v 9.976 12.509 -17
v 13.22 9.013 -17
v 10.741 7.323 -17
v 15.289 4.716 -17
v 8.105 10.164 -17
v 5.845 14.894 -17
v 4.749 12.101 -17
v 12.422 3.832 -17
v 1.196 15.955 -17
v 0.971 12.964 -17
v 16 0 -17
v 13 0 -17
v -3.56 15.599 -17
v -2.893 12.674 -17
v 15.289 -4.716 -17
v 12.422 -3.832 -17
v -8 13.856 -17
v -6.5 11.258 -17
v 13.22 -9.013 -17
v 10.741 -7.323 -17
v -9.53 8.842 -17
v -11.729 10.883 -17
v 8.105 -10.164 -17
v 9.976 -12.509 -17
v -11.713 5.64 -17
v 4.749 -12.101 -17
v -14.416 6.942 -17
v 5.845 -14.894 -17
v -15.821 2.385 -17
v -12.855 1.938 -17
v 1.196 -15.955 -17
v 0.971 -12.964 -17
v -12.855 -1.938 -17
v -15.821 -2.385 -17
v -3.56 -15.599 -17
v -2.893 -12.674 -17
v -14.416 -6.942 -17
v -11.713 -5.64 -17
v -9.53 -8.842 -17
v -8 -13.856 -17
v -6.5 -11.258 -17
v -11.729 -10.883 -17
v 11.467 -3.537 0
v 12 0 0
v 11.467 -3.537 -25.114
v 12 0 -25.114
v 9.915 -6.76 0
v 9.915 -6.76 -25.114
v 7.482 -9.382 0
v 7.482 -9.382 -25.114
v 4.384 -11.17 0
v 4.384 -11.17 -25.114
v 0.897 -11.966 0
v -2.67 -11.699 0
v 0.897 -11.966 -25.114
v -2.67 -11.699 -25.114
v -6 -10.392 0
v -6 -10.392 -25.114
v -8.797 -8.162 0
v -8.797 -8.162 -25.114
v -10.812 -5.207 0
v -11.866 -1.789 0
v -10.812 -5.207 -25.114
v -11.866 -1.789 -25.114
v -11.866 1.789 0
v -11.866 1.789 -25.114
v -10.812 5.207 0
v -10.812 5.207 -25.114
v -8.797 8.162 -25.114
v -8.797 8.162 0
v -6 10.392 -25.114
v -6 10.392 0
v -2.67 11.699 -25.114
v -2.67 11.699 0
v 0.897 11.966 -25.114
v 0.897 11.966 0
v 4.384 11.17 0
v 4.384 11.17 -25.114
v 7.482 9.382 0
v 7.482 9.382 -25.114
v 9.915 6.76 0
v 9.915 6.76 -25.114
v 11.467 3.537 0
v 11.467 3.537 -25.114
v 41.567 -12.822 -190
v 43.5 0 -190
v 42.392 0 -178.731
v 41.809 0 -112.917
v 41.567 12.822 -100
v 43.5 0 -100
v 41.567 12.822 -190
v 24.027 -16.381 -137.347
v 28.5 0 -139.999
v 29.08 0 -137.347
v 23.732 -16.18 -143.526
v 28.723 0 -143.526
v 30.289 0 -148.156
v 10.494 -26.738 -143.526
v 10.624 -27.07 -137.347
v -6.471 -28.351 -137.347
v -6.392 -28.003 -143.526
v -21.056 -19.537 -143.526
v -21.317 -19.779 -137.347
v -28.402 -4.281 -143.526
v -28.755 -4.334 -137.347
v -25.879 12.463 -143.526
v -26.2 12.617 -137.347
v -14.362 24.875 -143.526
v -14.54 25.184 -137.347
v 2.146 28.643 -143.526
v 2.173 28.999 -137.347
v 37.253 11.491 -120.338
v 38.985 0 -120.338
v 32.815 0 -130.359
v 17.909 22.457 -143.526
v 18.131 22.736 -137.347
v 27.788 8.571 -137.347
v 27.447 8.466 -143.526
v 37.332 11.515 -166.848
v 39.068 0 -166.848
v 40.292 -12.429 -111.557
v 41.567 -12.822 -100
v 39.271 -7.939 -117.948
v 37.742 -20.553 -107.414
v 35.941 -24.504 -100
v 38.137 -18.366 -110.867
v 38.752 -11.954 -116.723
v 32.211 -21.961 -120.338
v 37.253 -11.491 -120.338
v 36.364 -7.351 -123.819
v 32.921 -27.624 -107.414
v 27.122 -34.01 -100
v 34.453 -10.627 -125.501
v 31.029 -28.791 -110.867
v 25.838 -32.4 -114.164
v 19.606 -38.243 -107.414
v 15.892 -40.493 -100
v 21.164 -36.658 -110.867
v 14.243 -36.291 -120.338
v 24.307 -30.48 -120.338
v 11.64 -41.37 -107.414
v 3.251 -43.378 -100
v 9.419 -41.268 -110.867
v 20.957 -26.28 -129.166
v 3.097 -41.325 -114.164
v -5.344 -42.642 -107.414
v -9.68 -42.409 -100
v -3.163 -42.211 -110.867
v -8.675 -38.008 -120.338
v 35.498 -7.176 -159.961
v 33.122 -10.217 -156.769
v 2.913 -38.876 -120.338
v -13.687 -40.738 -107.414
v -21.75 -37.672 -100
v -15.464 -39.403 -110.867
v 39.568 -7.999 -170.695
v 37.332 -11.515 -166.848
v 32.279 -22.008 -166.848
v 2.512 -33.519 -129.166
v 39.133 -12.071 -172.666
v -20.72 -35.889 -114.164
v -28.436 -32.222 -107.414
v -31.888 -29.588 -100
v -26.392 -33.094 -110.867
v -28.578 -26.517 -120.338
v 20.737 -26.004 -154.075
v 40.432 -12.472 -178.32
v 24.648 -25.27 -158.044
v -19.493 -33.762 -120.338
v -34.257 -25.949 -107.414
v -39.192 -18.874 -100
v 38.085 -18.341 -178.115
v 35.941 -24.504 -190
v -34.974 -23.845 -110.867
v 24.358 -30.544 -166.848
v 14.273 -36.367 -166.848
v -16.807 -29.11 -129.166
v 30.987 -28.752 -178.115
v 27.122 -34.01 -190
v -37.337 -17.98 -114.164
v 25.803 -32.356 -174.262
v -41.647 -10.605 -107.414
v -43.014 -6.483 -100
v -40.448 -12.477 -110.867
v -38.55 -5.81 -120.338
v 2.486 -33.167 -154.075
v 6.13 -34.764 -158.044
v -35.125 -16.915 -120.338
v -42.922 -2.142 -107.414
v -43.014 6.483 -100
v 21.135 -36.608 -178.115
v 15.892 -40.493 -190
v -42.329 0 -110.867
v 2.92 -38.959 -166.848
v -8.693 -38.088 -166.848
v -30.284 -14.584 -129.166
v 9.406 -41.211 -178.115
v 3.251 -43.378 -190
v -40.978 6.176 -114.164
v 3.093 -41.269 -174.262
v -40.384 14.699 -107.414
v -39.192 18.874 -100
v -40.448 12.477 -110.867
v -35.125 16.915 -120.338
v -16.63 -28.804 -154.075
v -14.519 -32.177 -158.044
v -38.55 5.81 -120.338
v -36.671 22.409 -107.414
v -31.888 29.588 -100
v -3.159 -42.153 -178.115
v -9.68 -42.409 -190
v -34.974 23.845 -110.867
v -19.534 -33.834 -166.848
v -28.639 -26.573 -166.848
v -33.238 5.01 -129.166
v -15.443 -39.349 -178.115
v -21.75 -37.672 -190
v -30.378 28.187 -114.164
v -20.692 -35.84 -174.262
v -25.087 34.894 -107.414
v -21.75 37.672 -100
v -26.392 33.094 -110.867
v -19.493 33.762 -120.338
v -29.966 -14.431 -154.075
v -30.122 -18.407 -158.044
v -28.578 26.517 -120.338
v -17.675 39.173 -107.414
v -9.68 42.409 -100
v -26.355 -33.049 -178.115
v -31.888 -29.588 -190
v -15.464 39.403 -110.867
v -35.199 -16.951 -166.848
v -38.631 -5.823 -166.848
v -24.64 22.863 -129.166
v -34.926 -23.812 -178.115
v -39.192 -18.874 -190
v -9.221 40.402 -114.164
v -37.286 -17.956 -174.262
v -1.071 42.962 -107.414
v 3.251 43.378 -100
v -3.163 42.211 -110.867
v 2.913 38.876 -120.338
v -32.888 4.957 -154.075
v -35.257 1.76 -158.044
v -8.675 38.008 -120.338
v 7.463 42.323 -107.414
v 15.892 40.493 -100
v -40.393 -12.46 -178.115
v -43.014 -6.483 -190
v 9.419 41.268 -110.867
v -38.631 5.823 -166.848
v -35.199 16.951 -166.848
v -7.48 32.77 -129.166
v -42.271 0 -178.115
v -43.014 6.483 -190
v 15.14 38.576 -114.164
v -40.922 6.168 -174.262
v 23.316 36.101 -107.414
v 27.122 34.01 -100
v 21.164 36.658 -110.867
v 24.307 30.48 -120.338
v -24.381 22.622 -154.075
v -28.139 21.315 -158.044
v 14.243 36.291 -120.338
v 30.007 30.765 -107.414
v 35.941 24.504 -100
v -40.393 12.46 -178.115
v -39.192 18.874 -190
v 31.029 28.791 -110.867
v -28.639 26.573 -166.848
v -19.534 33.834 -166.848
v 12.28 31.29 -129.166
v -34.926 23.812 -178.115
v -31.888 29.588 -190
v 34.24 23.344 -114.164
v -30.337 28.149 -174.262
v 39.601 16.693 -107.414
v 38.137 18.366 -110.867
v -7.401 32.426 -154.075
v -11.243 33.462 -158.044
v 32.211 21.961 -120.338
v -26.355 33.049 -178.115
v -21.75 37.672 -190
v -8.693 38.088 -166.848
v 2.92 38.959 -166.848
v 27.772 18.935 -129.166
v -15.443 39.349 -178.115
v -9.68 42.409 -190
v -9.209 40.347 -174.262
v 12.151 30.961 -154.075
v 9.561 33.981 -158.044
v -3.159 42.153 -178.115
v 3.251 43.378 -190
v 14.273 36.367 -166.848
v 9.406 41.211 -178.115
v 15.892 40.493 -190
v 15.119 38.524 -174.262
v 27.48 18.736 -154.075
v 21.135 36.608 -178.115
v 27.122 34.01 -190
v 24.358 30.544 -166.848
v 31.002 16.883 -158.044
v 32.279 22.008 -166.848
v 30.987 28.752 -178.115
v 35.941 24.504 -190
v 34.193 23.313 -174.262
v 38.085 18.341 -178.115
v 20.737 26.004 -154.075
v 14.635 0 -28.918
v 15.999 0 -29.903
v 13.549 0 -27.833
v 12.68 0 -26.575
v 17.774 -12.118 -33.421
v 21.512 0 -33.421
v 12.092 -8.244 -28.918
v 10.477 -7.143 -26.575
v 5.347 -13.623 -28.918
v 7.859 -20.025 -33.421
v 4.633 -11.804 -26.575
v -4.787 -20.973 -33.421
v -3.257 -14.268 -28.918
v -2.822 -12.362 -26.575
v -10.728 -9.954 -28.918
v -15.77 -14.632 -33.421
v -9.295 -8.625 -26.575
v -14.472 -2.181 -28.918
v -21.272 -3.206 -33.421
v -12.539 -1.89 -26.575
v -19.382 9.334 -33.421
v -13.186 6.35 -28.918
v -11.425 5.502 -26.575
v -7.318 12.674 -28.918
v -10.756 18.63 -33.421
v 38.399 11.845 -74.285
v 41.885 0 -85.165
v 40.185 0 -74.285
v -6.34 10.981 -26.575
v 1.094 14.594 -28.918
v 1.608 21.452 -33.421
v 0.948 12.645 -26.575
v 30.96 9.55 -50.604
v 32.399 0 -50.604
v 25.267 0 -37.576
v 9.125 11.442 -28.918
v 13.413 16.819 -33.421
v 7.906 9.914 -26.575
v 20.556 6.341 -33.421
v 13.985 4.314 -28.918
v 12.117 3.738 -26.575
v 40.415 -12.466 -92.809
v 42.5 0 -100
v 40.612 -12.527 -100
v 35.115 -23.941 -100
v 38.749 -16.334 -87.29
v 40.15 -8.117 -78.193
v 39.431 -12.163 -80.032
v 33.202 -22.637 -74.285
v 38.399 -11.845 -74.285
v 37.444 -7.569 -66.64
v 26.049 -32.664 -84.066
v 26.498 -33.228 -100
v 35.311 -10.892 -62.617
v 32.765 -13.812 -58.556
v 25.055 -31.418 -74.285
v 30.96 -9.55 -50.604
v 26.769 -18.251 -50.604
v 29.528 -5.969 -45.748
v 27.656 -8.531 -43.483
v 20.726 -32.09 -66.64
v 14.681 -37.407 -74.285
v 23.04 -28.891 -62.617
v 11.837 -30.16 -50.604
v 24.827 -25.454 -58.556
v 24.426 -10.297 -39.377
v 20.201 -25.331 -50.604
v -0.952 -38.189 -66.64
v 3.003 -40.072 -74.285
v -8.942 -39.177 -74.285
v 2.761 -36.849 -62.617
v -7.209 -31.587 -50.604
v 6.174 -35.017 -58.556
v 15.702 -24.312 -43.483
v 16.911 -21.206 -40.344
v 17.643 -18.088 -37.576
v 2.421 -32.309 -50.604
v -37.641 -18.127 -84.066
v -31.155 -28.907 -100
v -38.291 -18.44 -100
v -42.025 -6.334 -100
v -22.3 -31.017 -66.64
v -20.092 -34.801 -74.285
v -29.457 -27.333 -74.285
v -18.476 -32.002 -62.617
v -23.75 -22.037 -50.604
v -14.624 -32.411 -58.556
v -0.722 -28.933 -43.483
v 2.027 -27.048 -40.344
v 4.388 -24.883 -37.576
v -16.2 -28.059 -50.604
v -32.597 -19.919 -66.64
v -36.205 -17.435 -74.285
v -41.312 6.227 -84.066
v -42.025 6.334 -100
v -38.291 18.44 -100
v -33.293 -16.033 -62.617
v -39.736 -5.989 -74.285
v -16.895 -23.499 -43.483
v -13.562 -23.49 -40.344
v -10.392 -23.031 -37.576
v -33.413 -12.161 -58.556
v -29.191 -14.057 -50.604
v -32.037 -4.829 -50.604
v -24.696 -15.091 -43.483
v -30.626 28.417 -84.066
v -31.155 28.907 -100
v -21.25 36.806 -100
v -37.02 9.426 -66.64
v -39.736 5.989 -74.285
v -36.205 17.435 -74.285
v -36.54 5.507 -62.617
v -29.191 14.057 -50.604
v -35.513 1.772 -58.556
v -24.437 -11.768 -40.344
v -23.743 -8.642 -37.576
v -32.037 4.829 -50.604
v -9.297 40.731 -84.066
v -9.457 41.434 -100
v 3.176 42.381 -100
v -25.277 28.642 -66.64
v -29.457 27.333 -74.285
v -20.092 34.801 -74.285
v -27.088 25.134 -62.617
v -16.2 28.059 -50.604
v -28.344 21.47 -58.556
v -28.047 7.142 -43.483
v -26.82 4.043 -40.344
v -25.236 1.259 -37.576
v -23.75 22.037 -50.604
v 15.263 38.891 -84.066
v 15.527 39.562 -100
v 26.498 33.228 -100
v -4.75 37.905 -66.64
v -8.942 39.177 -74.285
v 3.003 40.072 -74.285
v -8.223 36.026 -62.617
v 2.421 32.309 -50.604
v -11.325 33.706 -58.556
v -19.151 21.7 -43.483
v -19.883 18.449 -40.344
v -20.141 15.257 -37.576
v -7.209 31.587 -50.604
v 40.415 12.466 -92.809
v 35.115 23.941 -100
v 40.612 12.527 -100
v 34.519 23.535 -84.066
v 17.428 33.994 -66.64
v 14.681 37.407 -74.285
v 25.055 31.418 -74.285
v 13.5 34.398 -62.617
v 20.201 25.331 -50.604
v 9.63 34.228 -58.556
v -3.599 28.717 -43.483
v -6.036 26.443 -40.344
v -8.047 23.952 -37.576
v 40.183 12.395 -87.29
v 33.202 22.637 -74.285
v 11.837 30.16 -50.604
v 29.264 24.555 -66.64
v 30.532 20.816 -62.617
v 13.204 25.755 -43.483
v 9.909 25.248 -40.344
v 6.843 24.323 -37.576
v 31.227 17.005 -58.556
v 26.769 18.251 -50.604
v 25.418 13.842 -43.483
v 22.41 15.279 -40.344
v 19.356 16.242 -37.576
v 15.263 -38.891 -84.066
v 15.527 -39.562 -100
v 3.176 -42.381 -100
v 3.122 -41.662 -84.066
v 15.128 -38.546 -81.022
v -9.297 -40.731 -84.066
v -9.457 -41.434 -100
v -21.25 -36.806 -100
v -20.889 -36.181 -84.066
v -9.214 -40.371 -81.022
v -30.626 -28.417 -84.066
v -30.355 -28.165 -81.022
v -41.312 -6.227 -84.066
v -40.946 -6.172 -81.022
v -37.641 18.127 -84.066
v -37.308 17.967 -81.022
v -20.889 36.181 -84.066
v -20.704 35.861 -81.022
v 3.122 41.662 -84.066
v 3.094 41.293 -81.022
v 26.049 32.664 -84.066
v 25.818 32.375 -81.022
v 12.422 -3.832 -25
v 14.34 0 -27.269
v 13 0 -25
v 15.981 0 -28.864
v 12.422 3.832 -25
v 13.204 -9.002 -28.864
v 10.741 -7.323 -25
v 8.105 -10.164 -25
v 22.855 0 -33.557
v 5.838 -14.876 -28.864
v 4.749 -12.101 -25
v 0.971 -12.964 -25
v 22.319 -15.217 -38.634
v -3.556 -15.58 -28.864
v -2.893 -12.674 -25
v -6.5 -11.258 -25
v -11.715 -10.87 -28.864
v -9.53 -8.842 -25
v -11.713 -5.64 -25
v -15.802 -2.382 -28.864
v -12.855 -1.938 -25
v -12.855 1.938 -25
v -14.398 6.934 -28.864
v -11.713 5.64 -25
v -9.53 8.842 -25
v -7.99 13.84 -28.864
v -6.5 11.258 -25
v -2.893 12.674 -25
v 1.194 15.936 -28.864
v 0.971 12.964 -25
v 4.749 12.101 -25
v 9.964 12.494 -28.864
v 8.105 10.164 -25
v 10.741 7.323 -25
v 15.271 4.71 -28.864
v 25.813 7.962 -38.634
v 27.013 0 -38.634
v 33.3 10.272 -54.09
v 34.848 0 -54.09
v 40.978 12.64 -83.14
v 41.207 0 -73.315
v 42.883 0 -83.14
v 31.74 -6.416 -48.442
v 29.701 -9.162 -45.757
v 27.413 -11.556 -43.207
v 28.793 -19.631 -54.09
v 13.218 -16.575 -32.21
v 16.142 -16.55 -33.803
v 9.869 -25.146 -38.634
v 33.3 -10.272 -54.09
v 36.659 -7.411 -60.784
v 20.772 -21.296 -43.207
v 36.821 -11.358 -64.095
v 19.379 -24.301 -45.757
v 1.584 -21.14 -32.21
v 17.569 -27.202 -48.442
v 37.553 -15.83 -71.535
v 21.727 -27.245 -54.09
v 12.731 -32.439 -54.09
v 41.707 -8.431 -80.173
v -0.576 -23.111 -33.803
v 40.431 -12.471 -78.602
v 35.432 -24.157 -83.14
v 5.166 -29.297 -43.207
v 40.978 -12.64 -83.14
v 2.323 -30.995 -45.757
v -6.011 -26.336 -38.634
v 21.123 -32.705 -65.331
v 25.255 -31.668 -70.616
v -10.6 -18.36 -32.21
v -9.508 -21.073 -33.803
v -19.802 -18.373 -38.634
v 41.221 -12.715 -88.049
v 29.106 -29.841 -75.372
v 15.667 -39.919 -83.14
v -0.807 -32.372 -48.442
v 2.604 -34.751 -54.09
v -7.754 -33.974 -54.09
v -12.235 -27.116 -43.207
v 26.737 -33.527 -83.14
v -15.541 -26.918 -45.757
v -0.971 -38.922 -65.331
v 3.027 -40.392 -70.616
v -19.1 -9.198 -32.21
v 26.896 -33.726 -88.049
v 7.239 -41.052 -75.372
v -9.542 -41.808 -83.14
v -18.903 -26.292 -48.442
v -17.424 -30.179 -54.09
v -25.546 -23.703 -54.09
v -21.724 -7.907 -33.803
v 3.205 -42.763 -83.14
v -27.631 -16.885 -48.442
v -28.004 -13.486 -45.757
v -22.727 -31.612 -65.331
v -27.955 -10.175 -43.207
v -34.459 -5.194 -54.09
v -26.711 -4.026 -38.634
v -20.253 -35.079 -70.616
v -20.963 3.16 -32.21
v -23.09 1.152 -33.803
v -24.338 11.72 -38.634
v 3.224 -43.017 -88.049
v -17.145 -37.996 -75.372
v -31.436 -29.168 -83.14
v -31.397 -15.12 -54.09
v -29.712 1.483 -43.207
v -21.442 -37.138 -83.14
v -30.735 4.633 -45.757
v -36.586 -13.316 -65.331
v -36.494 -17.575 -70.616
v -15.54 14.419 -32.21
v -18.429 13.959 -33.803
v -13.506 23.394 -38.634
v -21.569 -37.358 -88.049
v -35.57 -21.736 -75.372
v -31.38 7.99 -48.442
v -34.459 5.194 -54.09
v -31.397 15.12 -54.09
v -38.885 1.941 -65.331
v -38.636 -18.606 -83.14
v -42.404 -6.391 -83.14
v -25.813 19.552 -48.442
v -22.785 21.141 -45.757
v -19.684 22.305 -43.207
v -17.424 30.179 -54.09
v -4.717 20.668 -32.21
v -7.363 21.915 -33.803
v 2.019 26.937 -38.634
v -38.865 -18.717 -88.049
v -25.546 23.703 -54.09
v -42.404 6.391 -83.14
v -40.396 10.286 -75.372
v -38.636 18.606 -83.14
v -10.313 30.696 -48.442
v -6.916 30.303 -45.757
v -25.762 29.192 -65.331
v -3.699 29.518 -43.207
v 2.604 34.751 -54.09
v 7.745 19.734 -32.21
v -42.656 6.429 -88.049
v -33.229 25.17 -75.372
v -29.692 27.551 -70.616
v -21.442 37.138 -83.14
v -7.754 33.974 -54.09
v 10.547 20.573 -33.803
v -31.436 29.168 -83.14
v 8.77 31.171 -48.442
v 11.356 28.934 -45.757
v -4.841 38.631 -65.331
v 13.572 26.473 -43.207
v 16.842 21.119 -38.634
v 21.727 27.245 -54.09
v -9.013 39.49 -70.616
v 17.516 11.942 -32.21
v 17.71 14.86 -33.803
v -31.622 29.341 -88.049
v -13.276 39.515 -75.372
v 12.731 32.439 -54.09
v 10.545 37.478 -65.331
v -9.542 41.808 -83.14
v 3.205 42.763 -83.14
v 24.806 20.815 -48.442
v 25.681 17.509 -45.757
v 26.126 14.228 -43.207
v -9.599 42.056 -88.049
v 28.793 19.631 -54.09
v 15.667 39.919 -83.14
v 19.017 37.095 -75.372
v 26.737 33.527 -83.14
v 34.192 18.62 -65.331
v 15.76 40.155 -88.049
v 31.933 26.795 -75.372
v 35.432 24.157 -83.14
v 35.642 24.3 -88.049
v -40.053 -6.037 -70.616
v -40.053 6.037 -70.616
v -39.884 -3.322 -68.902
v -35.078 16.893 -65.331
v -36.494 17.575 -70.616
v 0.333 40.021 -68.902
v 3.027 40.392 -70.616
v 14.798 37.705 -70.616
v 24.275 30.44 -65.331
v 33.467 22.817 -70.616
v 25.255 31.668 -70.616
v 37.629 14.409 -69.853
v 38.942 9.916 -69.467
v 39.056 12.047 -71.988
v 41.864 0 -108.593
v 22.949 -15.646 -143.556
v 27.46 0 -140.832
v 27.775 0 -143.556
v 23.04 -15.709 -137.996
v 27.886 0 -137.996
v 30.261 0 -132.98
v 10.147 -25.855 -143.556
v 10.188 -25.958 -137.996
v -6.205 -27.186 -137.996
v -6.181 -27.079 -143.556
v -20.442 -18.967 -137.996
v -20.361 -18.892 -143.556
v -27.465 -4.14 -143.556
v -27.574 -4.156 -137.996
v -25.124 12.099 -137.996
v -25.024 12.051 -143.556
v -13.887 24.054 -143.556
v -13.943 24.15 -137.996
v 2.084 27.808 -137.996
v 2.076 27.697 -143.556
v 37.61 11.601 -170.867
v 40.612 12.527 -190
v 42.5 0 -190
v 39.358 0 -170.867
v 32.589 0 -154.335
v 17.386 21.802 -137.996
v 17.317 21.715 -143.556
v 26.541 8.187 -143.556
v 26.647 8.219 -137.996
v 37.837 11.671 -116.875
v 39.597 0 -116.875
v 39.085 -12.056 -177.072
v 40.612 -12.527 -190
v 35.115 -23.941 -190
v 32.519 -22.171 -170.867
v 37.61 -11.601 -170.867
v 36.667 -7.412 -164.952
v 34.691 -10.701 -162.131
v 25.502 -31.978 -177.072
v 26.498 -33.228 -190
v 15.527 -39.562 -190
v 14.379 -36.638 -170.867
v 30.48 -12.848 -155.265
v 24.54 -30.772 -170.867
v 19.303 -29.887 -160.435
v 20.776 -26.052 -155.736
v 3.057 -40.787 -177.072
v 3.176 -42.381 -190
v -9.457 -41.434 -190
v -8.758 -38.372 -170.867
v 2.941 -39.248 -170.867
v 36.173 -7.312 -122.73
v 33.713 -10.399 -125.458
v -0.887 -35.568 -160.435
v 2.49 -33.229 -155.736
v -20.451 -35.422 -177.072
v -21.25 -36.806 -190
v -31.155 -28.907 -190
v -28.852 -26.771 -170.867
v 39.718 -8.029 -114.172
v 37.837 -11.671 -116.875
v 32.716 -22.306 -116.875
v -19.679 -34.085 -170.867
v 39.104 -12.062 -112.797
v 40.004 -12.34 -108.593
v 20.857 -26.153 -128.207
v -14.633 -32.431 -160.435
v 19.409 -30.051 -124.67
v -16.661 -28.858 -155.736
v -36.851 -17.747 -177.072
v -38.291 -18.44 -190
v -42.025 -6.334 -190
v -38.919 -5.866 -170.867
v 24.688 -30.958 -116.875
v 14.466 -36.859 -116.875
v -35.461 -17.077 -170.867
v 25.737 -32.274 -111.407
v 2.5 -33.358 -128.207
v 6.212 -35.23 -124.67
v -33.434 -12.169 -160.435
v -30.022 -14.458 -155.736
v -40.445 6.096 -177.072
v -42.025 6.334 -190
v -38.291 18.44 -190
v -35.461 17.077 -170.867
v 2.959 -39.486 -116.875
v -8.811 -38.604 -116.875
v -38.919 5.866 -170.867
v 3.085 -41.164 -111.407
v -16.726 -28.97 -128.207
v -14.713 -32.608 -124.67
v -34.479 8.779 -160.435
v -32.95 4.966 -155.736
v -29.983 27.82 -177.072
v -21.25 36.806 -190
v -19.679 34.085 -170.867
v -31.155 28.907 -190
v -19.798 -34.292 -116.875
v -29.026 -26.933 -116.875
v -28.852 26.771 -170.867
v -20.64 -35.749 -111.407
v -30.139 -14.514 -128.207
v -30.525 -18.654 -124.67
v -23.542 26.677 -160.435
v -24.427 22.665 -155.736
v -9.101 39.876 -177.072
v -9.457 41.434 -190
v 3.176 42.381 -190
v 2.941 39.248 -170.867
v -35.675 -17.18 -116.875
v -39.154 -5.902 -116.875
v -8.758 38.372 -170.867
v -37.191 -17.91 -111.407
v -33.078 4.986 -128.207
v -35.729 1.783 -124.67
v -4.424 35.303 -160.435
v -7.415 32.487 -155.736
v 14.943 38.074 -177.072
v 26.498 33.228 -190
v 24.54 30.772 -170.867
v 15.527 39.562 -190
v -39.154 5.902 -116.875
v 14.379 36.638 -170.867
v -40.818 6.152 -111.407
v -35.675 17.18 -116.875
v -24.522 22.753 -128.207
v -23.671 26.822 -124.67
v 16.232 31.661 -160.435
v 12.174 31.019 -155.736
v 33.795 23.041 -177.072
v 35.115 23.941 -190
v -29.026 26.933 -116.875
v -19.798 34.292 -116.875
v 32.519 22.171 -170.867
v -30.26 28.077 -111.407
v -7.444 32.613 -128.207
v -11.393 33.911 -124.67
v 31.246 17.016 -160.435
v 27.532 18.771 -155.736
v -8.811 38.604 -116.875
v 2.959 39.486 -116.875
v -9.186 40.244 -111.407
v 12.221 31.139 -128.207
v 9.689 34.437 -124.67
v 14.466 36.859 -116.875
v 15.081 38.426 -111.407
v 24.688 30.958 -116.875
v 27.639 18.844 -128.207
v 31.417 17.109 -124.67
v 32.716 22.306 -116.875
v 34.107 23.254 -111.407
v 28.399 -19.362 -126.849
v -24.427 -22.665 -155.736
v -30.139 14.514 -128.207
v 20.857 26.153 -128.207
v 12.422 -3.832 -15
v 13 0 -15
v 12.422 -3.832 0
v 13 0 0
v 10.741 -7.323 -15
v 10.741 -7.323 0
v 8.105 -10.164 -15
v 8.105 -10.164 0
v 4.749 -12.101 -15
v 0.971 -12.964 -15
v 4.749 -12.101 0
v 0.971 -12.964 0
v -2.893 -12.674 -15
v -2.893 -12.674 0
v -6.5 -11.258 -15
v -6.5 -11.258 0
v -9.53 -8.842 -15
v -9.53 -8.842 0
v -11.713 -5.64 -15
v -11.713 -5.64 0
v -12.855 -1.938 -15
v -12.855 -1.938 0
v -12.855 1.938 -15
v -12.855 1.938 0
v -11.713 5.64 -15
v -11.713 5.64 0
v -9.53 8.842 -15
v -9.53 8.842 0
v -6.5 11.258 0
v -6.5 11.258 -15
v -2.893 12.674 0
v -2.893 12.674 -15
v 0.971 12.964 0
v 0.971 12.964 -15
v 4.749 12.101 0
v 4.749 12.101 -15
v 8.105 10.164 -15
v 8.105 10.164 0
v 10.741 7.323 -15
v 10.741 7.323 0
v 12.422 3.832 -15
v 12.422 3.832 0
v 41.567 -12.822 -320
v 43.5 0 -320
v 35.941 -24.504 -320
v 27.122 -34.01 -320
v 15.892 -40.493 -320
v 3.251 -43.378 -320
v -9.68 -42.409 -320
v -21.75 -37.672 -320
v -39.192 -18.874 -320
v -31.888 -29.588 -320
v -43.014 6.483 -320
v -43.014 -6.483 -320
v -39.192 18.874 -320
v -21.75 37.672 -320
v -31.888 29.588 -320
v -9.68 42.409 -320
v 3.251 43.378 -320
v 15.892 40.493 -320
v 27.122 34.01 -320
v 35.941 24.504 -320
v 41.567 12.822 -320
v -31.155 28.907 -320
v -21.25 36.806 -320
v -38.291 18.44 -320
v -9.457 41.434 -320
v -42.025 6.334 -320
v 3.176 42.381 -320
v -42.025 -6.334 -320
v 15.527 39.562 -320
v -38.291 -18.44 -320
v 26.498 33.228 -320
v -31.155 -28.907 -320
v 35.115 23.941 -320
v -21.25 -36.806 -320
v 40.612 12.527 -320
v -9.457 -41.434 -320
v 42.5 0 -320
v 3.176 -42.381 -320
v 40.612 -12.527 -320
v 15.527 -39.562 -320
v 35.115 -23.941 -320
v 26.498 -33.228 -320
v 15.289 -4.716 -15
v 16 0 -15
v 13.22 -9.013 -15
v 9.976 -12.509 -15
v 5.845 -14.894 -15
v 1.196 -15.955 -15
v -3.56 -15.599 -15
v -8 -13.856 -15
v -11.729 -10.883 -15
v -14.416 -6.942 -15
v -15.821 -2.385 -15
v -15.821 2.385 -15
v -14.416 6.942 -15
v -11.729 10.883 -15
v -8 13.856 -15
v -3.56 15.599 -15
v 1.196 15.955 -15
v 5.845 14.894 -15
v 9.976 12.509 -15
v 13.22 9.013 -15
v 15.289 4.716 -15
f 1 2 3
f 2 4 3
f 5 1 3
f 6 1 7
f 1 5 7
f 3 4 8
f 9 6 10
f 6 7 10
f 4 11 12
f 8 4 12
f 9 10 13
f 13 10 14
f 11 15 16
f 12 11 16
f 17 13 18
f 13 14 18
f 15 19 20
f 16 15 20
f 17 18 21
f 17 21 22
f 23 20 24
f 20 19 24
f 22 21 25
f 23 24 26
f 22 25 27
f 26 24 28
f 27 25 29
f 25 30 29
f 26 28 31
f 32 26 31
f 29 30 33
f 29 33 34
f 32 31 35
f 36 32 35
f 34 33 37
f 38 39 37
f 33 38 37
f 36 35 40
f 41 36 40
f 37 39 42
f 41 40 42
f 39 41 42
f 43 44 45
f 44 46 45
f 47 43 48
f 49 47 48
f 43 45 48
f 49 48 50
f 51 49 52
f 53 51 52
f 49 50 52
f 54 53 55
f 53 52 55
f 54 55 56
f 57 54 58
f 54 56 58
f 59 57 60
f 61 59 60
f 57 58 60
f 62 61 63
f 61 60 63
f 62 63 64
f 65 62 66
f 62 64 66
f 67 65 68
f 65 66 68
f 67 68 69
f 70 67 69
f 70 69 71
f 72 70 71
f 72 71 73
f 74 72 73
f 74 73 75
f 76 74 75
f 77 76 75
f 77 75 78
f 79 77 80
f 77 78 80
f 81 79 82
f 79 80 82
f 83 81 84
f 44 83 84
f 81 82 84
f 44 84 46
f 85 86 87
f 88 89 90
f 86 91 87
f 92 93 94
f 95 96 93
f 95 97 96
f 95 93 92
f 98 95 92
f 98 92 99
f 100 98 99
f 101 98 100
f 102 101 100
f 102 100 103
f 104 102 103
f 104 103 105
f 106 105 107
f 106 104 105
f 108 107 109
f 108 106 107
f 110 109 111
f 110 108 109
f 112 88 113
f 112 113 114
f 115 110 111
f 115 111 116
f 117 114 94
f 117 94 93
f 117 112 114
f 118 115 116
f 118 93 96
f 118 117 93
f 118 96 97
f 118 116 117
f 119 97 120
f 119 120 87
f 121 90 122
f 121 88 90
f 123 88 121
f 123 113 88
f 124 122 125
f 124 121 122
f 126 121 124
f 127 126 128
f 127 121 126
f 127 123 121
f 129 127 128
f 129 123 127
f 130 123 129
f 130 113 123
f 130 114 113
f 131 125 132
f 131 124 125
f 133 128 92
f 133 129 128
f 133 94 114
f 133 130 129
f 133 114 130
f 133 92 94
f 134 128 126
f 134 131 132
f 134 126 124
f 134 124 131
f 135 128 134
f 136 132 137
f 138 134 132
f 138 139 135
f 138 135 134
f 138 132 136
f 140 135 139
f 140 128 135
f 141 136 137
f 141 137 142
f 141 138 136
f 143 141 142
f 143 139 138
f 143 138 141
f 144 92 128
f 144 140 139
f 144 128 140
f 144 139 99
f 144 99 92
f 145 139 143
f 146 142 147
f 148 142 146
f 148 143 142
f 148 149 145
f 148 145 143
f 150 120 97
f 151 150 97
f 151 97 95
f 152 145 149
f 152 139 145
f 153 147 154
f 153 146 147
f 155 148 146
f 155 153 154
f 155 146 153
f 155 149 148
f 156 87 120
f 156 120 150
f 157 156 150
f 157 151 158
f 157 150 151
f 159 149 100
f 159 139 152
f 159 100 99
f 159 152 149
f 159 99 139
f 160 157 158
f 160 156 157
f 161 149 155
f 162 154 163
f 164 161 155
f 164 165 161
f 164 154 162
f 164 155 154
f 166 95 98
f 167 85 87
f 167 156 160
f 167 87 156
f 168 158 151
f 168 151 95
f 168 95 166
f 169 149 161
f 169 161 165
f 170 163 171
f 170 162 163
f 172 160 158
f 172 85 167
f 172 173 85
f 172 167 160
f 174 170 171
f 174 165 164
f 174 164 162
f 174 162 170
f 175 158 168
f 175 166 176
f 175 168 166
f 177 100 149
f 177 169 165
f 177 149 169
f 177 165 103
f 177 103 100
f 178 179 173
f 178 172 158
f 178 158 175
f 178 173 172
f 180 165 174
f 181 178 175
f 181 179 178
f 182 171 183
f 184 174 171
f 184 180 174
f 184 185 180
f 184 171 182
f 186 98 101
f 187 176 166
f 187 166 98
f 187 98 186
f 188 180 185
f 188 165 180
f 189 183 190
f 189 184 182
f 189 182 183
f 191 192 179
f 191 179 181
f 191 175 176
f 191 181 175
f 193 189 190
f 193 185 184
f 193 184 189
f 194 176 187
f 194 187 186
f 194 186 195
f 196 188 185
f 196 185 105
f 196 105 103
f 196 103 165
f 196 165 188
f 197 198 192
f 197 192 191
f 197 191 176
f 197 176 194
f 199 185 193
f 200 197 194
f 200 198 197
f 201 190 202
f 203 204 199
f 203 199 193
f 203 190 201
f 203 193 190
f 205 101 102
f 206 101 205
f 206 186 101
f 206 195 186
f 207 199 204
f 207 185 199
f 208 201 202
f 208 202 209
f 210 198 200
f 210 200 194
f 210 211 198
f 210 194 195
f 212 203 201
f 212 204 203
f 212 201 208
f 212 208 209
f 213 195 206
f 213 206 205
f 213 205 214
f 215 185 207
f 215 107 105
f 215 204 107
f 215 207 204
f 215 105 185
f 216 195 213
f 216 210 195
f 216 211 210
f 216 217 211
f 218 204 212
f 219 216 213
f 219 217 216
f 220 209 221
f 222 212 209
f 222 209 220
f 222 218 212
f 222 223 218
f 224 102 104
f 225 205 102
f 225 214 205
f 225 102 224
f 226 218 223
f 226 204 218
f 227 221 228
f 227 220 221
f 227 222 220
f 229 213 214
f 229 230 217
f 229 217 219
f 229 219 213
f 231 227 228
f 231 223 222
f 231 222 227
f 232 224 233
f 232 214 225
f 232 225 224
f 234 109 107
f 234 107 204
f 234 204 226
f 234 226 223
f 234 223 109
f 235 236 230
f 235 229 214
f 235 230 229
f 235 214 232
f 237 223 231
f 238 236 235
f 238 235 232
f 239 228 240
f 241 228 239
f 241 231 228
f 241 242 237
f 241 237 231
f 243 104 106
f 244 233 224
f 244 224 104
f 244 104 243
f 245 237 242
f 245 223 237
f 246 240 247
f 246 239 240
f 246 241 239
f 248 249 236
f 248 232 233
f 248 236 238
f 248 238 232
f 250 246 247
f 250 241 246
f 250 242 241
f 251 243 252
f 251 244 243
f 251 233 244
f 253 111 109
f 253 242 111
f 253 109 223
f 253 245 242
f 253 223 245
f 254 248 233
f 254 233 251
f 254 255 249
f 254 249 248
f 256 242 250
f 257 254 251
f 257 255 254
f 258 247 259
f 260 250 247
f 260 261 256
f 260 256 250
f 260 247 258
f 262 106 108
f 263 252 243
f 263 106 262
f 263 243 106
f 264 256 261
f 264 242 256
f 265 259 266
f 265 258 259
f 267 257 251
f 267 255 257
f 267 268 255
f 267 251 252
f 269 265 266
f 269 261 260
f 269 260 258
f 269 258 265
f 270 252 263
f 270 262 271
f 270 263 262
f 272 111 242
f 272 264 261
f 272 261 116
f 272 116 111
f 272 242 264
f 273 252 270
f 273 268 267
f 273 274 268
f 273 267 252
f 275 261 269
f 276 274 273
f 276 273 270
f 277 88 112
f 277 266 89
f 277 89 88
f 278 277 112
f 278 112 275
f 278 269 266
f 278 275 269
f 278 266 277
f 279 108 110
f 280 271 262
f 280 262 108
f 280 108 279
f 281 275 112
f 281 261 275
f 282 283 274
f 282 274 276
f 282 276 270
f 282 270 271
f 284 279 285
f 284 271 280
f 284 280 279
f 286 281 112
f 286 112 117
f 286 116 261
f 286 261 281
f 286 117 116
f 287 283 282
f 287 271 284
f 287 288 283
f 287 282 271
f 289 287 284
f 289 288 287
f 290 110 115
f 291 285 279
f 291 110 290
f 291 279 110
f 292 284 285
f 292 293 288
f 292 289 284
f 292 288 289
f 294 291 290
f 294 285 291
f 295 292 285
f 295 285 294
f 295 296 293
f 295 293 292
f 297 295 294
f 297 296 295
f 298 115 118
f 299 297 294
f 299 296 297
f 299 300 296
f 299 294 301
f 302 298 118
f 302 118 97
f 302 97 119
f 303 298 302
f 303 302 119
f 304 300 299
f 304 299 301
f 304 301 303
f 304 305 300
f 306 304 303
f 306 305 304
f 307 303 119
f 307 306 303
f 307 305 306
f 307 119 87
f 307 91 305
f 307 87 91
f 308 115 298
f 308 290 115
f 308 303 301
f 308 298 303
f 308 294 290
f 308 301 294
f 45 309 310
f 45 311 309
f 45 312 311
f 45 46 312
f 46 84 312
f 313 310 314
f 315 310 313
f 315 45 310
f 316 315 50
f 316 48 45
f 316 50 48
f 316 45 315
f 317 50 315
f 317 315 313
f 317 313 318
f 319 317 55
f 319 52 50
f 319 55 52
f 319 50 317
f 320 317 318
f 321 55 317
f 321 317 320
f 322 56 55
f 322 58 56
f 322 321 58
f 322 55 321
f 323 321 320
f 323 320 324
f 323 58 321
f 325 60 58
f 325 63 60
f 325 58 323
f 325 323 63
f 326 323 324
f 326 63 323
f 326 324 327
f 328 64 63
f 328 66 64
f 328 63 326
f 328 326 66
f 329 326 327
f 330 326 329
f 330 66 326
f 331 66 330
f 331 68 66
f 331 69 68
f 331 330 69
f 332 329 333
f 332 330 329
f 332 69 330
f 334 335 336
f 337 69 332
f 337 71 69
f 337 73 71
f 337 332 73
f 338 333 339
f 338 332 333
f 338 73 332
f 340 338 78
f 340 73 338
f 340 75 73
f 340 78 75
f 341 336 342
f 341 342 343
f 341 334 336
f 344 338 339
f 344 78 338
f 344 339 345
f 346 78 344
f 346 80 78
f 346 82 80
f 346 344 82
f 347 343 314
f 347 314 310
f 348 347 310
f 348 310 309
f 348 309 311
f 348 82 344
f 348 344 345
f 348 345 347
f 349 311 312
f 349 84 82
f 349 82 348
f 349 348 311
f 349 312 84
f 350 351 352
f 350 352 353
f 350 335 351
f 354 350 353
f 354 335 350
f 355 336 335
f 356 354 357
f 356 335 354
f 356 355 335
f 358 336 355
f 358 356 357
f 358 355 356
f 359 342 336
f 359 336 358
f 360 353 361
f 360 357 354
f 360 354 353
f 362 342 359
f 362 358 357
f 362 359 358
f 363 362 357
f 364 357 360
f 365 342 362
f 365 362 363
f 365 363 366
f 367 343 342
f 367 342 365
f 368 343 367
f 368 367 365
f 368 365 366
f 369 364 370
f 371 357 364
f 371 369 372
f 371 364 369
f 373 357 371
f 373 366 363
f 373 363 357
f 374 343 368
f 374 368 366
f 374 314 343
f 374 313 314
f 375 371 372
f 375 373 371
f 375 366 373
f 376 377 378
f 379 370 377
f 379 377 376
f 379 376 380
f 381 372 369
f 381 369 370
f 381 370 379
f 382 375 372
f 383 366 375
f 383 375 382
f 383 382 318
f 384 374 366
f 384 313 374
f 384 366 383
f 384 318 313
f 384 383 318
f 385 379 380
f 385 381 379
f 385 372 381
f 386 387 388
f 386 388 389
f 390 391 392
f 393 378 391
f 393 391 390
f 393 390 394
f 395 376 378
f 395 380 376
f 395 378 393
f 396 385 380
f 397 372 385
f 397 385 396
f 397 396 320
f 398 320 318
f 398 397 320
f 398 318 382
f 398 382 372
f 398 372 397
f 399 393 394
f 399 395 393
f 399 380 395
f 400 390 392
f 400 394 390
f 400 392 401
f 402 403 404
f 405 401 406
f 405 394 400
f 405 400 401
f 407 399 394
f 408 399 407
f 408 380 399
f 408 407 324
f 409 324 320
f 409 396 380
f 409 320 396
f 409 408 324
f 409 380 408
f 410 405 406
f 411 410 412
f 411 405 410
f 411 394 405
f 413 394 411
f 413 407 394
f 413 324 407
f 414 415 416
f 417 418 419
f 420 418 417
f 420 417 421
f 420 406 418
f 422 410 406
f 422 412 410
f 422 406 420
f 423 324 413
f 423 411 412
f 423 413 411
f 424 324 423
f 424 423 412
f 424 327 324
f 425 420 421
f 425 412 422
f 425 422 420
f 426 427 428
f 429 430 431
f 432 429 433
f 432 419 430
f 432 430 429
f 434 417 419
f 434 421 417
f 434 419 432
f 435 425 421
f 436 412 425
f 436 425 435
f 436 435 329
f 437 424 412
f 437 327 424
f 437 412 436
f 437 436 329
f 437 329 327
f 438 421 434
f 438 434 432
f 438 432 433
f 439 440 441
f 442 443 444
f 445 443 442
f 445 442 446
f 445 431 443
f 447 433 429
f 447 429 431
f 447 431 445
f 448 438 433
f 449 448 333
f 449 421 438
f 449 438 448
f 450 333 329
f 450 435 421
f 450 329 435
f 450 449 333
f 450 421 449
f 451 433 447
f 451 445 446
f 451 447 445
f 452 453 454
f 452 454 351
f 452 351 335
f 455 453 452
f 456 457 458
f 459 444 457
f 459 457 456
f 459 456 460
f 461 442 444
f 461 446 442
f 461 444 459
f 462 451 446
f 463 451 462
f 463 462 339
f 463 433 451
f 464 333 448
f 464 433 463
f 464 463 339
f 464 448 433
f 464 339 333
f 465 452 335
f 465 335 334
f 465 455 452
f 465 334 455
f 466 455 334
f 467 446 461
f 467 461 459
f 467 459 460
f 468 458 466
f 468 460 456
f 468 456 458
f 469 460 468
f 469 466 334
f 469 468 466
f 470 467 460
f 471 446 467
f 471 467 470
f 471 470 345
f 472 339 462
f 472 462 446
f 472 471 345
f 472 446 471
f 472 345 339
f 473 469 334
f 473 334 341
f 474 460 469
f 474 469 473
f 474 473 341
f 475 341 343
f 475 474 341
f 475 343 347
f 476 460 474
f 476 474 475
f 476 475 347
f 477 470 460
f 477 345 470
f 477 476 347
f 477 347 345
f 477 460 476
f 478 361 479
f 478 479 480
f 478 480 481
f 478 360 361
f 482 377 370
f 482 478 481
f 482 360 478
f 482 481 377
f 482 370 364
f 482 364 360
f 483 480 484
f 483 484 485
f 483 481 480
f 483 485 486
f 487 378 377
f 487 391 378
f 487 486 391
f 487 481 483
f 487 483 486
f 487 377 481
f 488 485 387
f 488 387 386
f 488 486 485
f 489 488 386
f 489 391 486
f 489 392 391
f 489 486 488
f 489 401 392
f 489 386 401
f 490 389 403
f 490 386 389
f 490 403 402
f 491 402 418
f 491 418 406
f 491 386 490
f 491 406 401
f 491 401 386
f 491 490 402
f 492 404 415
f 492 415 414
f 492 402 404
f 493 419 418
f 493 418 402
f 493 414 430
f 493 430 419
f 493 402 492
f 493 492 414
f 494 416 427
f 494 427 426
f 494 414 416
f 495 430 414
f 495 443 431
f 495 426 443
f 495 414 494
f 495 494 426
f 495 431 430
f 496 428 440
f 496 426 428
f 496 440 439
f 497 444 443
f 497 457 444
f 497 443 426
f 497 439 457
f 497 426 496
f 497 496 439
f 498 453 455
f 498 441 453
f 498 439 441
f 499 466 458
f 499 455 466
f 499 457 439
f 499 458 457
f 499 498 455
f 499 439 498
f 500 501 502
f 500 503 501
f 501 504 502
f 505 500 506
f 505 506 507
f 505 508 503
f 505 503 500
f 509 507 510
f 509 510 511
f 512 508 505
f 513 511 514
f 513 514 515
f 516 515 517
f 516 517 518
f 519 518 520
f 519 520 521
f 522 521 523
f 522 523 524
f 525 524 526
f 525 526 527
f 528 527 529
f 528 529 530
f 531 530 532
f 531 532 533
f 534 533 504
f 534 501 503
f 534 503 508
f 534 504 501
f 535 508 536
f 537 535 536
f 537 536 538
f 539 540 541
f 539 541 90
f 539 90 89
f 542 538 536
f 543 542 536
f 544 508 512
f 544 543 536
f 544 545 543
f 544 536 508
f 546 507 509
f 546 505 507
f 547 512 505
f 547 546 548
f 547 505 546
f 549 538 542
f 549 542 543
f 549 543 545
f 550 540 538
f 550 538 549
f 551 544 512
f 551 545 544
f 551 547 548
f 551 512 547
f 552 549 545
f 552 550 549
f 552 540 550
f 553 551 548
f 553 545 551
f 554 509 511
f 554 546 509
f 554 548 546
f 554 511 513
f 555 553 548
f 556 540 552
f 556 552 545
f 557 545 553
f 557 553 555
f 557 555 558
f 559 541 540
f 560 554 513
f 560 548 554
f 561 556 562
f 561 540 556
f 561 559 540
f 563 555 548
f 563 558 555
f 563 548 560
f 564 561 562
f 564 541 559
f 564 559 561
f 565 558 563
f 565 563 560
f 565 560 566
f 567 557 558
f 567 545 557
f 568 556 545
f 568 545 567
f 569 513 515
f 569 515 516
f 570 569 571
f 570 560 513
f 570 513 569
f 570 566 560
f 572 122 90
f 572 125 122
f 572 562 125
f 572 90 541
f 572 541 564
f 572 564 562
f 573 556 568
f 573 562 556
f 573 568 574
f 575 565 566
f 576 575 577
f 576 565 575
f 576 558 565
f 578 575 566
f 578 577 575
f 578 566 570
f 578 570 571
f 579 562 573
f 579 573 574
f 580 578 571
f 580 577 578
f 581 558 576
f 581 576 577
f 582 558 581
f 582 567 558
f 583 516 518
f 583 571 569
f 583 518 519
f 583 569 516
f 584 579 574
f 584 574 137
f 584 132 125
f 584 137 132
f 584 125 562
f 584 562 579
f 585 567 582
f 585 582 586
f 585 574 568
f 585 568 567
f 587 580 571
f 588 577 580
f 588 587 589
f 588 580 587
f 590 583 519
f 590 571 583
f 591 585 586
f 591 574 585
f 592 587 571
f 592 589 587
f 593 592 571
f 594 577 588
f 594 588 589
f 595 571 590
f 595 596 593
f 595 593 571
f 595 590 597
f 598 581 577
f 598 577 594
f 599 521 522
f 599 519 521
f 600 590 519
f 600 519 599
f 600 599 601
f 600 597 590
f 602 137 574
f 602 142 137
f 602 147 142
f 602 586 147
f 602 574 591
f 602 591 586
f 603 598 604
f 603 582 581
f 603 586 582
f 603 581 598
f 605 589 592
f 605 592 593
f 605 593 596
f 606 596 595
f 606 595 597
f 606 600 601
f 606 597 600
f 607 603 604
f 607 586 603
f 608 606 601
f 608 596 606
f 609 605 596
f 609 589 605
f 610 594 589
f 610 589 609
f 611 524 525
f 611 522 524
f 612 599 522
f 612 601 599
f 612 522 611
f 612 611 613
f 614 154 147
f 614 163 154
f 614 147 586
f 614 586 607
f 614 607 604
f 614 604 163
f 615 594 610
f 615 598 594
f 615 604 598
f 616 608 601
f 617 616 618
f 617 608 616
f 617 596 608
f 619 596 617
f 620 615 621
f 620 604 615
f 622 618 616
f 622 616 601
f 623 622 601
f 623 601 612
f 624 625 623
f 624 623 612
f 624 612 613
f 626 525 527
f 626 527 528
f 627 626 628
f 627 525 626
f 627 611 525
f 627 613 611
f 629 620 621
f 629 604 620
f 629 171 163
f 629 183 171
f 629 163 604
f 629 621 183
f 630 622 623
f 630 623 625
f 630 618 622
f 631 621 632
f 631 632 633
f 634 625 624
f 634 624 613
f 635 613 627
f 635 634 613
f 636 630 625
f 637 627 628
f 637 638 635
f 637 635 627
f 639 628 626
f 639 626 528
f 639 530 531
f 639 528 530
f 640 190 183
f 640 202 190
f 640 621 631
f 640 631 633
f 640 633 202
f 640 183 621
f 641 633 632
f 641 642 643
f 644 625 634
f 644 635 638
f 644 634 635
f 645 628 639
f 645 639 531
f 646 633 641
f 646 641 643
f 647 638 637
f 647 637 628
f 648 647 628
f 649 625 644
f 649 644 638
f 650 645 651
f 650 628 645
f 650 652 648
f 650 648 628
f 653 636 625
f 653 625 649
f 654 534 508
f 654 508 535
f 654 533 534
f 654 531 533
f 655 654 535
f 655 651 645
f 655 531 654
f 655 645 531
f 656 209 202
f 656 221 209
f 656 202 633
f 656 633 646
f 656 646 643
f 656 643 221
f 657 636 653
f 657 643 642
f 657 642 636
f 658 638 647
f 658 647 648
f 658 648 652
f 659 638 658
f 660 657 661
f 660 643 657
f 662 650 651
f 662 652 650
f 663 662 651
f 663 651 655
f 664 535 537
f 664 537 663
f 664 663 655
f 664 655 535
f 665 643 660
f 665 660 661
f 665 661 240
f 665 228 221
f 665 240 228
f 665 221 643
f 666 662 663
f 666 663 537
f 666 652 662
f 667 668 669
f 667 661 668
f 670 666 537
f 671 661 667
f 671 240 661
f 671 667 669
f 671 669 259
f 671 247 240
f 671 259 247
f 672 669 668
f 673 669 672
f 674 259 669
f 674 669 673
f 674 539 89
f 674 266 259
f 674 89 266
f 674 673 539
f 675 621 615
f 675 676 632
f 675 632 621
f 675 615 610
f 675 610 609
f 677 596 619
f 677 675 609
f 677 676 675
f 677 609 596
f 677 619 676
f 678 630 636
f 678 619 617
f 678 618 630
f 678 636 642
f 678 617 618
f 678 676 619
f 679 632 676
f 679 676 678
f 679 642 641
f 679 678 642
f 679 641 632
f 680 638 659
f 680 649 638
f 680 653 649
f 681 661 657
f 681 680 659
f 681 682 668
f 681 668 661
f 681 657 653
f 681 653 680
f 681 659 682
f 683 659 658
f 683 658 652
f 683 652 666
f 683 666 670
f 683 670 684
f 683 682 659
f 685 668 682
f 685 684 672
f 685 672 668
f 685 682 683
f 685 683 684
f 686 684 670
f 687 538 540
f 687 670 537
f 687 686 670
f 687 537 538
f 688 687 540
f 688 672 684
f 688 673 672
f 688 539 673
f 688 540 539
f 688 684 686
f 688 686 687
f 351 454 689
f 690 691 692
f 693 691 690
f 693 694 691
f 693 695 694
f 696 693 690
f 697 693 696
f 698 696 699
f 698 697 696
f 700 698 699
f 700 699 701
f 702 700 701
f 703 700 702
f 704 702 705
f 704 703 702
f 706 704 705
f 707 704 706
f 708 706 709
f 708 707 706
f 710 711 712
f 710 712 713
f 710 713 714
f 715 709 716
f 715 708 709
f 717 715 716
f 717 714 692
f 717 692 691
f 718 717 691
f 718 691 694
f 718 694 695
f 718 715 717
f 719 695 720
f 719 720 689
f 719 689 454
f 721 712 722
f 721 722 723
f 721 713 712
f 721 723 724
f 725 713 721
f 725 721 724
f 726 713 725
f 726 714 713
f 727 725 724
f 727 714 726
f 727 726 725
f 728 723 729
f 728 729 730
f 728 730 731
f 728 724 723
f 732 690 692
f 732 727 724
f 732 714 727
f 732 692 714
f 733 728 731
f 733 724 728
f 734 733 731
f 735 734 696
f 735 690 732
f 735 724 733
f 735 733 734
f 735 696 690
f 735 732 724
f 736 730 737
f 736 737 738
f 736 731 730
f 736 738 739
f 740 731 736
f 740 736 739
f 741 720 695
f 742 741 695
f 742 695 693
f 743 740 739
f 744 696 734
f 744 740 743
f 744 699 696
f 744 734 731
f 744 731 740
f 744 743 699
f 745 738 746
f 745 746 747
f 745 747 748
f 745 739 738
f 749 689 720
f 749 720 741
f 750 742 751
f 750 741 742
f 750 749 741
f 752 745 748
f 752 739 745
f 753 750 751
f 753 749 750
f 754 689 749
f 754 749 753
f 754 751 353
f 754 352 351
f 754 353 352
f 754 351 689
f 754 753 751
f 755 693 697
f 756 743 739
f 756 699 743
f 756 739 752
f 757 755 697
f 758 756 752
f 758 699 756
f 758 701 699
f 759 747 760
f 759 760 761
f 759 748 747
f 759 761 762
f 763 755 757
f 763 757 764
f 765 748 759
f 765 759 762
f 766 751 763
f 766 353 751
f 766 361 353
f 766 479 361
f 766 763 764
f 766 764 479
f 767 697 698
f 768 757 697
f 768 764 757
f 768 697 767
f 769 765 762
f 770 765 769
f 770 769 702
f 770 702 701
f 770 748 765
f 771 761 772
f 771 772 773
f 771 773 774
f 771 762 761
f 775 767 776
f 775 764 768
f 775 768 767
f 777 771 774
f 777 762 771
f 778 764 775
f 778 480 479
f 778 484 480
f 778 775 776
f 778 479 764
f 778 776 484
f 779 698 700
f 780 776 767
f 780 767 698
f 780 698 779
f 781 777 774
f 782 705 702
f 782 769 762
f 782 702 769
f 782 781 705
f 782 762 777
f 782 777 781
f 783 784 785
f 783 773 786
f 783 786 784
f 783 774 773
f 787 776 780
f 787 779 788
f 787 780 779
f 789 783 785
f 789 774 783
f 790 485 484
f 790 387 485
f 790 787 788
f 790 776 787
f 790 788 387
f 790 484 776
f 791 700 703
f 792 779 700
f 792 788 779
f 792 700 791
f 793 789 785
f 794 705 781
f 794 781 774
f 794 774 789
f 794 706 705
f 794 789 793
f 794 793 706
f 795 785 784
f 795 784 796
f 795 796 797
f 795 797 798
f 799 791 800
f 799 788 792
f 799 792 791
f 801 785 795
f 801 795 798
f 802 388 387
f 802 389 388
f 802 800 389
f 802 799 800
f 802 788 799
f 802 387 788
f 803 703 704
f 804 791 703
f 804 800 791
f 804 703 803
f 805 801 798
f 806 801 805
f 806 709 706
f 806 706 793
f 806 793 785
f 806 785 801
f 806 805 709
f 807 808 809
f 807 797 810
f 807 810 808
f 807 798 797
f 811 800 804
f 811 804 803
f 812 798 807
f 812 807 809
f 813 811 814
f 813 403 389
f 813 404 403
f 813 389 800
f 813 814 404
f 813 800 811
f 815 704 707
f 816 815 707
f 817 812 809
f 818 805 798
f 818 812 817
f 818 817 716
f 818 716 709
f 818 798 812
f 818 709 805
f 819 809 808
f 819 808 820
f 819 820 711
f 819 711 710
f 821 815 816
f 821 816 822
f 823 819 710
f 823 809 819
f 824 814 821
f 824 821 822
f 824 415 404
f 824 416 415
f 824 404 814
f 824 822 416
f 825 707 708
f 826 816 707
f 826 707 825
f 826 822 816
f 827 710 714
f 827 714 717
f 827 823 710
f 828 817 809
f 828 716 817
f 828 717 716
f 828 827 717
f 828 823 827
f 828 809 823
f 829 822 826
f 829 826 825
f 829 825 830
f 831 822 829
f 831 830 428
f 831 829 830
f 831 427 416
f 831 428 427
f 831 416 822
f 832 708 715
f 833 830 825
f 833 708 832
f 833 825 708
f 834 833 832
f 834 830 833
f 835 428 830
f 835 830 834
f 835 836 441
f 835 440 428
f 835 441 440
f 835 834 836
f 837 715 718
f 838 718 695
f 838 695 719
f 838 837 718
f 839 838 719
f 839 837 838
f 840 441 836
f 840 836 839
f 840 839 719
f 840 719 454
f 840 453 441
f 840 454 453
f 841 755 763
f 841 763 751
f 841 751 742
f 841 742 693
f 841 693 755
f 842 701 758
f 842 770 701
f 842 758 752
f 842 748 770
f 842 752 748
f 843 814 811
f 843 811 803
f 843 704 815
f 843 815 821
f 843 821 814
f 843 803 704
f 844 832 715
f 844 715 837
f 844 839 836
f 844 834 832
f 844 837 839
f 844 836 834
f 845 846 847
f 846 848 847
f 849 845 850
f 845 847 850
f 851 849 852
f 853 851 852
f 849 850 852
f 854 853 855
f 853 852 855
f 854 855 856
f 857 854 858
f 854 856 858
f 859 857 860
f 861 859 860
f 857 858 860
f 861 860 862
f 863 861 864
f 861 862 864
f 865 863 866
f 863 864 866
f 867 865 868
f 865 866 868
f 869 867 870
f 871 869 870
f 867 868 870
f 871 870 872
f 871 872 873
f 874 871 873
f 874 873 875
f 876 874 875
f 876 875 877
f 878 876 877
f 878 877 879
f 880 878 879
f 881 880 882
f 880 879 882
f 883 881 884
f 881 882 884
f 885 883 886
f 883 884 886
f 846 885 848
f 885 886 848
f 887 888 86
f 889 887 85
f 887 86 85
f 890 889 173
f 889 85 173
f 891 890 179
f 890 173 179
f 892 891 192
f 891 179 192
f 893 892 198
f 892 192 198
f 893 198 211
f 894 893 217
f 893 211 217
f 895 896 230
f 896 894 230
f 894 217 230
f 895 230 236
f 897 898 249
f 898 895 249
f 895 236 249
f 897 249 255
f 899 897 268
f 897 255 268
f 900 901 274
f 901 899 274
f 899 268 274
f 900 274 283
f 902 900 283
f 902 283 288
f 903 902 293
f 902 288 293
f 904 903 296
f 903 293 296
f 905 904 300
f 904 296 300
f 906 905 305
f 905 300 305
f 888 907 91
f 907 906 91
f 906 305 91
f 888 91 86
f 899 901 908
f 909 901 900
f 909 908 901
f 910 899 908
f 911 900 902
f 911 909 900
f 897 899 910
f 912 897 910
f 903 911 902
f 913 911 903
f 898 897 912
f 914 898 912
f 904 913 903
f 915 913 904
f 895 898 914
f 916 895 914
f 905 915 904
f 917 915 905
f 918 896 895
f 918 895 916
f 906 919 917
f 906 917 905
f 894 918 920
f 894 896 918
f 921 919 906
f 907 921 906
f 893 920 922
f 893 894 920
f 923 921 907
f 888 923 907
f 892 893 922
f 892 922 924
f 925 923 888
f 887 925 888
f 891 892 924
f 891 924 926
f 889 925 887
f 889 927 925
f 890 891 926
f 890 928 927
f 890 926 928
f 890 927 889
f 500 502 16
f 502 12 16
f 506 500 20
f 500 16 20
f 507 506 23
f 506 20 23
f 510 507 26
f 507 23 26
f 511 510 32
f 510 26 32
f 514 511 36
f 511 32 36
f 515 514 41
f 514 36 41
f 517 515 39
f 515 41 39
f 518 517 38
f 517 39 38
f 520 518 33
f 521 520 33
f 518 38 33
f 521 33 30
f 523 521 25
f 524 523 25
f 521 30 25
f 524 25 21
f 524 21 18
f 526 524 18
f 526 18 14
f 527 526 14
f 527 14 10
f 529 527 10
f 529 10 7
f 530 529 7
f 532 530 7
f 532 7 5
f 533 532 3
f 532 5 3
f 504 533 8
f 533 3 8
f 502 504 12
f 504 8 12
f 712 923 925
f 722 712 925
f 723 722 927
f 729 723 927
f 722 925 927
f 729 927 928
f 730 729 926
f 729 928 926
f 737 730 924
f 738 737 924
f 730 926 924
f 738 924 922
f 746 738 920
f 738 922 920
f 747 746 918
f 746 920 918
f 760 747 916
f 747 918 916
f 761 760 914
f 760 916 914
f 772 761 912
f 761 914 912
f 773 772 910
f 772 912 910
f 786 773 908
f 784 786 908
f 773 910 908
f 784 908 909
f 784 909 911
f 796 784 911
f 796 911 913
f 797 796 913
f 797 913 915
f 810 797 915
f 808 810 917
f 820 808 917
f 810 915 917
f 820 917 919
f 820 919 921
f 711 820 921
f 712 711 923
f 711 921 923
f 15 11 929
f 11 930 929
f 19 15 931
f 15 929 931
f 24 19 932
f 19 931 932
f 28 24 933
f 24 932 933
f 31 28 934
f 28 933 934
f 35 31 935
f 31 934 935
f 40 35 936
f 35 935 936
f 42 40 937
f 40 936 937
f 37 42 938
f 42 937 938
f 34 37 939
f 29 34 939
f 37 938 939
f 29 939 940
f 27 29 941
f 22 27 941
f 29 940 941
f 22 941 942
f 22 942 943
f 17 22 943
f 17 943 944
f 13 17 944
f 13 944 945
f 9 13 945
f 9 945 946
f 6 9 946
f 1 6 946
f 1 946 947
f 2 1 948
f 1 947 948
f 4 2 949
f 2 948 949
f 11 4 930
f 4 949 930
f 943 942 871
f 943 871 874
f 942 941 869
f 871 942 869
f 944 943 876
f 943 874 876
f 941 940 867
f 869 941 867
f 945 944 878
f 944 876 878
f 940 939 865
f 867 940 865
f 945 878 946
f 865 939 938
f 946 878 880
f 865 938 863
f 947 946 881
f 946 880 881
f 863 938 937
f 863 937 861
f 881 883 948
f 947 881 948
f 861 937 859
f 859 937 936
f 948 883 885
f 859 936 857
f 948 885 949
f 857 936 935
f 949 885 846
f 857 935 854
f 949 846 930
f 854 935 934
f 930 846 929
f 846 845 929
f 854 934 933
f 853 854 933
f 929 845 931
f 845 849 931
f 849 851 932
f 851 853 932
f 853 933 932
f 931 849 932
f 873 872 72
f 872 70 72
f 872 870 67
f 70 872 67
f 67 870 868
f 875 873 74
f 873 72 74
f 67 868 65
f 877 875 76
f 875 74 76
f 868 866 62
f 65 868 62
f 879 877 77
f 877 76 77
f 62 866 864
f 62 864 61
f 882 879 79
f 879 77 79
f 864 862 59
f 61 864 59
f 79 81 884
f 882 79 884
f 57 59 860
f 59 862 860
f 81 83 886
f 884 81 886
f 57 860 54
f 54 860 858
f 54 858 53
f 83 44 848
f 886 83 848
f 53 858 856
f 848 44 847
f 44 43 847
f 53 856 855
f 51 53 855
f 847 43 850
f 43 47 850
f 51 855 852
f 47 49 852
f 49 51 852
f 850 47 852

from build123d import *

# Parameters (mm, degrees)
F2_W     = 90.759490079
F2_H     = 30
F3_DEPTH = 50


with BuildPart() as f1:
    # F0 (on Front) → F1 (revolve)
    with BuildSketch(Plane.XZ):
        with BuildLine():
            Line((0, -349), (0, -350))
            Line((0, -350), (23.5, -350))
            ThreePointArc((23.5, -350), (37.6421356237, -344.1421356237), (43.5, -330))
            Line((43.5, -330), (43.5, -190))
            add(Edge.make_bspline(
                [(43.5, -100), (43.5136655823, -109.2677385113), (39.1523633552, -123.5841908002), (24.2069666289, -139.9270455841), (36.8772857328, -158.3450760247), (43.5142465453, -178.4930156545), (43.5, -190)],
                knots=[0, 0, 0, 0, 0.2553201748, 0.4772684921, 0.7031288482, 1, 1, 1, 1], degree=3))
            add(Edge.make_bspline(
                [(13, -25), (15.153980754, -30.004083225), (26.3990720982, -29.6995209895), (44.8019804311, -78.3531291958), (42.8678392414, -88.8611251657), (43.5, -100)],
                knots=[0, 0, 0, 0, 0.239885862, 0.6752778241, 1, 1, 1, 1], degree=3))
            Line((13, -25), (13, -17))
            Line((13, -17), (16, -17))
            Line((16, -17), (16, -15))
            Line((16, -15), (13, -15))
            Line((13, -15), (13, 0))
            Line((13, 0), (12, 0))
            Line((12, 0), (12, -1))
            Line((12, -1), (12, -25.1138266176))
            add(Edge.make_bspline(
                [(42.5, -100), (42.1580635011, -92.4746021628), (43.1338322578, -76.1216357103), (25.4300825706, -29.885728794), (13.9739168808, -30.3249489516), (12, -25.1138266176)],
                knots=[0, 0, 0, 0, 0.3254300492, 0.7613683252, 1, 1, 1, 1], degree=3))
            add(Edge.make_bspline(
                [(42.5, -190), (42.0858003199, -178.4723848104), (36.3650992329, -158.3583449355), (23.0339165178, -139.8179083613), (38.4175773884, -124.0130301912), (42.7362024784, -108.3010882139), (42.5, -100)],
                knots=[0, 0, 0, 0, 0.2965395662, 0.5226698941, 0.7450400773, 1, 1, 1, 1], degree=3))
            Line((42.5, -190), (42.5, -330))
            ThreePointArc((42.5, -330), (36.9350288425, -343.4350288425), (23.5, -349))
            Line((23.5, -349), (0, -349))
        make_face()
    revolve(axis=Axis((0, 0, -175), (0, 0, -1)))

    # F2 (on Front) → F3 (cut, symmetric)
    with BuildSketch(Plane.XZ):
        with Locations((0.3664636352, -335)):
            Rectangle(F2_W, F2_H)
    extrude(amount=F3_DEPTH, both=True, mode=Mode.SUBTRACT)


solid = f1.part
